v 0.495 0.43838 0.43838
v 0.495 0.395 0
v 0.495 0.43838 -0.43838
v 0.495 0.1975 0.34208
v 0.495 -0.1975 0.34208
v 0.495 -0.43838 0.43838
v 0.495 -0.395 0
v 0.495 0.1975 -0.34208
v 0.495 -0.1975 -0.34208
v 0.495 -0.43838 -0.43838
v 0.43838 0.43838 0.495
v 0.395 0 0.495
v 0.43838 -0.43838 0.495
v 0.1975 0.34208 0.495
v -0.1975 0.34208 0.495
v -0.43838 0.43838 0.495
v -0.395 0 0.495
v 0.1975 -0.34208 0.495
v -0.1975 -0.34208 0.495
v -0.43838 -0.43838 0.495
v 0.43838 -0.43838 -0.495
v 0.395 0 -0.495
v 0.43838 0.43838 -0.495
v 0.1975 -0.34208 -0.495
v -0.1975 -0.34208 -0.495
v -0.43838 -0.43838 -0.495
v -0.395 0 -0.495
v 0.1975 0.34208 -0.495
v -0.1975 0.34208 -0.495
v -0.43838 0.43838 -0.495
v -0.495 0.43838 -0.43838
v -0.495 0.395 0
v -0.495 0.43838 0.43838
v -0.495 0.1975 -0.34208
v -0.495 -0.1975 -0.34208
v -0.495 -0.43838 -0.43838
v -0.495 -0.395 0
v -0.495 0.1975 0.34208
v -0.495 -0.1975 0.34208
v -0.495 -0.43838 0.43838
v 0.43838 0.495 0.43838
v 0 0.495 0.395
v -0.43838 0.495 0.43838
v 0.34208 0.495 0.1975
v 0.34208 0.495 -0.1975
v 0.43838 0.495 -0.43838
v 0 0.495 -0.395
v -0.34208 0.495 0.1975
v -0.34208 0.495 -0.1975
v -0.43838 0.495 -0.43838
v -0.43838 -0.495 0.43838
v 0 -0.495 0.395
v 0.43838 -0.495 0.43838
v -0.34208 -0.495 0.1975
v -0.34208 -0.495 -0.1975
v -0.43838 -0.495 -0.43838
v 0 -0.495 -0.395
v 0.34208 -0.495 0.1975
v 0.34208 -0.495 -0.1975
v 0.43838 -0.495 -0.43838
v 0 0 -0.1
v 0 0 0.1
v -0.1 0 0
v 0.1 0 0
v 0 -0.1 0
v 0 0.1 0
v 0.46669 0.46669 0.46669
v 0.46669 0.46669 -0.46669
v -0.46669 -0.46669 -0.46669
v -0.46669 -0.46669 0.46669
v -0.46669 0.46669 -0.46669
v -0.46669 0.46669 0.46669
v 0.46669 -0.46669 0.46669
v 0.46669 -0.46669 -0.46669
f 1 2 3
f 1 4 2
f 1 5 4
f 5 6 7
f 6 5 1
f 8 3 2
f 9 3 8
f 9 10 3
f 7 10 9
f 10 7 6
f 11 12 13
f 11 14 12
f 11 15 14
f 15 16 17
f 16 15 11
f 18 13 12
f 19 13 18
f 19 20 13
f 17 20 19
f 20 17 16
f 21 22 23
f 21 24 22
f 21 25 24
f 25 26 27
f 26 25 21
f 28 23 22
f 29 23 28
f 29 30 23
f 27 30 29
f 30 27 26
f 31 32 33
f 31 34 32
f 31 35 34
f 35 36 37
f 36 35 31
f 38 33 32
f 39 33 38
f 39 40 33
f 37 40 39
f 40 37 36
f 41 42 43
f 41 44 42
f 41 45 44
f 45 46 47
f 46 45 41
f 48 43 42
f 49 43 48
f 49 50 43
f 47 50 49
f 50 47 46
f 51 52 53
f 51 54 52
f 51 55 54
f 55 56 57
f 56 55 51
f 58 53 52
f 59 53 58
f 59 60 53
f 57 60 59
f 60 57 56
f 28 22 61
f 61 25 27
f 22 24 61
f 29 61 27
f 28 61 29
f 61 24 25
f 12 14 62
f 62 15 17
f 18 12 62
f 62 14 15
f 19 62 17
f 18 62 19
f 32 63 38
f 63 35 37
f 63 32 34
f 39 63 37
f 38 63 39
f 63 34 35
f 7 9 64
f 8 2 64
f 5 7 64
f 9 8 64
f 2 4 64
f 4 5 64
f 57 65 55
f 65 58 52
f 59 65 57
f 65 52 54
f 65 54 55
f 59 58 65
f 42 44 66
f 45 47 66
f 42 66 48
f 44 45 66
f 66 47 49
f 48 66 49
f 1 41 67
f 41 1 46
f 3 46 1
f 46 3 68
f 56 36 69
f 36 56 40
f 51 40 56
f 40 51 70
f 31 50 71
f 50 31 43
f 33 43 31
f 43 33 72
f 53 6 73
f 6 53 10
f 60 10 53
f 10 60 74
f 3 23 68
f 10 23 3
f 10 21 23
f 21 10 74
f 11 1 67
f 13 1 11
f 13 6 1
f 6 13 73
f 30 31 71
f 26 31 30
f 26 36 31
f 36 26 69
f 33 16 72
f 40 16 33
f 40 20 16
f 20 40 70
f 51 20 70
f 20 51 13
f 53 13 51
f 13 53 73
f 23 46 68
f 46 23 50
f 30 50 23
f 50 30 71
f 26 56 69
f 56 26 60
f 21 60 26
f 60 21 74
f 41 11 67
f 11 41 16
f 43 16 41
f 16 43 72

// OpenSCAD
$fn=6;
s=.99;
h=s/2;
o=s/4+.1;

intersection() {
    difference() {
        cube([s,s,s],center=true);
        translate([0,0,-o])
        cylinder(d1=s,d2=0,h=h,center=true);
        translate([0,0,o])
        cylinder(d2=s,d1=0,h=h,center=true);
        translate([-o,0,0])
        rotate([90,0,90])
        cylinder(d1=s,d2=0,h=h,center=true);
        translate([o,0,0])
        rotate([-90,0,-90])
        cylinder(d2=s,d1=0,h=h,center=true);
        translate([0,-o,0])
        rotate([0,90,90])
        cylinder(d1=s,d2=0,h=h,center=true);
        translate([0,o,0])
        rotate([0,-90,-90])
        cylinder(d2=s,d1=0,h=h,center=true);
    }
    intersection() {
        t=s*4/3;
        rotate([0,0,45])
        cube([t,t,t],center=true);
        rotate([0,45,0])
        cube([t,t,t],center=true);
        rotate([45,0,0])
        cube([t,t,t],center=true);
    }
}
